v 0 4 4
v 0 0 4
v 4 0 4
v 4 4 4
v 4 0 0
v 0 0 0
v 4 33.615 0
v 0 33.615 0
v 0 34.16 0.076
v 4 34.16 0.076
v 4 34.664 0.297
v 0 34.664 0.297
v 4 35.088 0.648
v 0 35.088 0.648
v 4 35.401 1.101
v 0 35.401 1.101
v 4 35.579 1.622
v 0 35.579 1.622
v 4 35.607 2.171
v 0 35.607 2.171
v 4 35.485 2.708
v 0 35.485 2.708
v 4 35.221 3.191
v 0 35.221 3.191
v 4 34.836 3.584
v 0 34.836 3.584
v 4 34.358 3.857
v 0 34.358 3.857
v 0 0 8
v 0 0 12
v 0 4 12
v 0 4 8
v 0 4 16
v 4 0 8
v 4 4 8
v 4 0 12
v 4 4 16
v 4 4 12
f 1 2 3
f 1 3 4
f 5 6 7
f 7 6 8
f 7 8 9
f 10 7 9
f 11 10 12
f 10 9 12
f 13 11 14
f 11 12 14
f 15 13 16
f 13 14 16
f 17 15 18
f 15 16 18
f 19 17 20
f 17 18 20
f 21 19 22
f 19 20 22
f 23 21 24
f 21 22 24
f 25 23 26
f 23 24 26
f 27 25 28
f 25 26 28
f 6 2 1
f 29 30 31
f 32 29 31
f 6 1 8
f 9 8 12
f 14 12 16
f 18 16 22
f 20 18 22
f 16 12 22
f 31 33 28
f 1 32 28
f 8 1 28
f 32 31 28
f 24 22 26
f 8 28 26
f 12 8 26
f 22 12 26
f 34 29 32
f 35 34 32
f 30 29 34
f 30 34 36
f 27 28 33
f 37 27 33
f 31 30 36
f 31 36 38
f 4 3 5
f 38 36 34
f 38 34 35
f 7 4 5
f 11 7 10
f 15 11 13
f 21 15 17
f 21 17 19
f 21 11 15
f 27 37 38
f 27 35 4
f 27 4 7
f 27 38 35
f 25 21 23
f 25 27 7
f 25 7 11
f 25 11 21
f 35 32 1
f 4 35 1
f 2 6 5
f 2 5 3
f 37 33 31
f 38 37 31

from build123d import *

# Parameters (mm, degrees)
F0_W     = 4
F0_H     = 4
F1_DEPTH = 4


with BuildPart() as f1:
    # F0 (on Right) → F1 (new body)
    with BuildSketch(Plane.YZ):
        with BuildLine():
            Line((4, 4), (4, 0))
            Line((4, 0), (33.614835, 0))
            ThreePointArc((33.614835, 0), (35.578748, 1.621785), (34.357617, 3.856953))
            Line((34.357617, 3.856953), (4, 16))
            Line((4, 16), (4, 12))
            Line((4, 12), (4, 8))
            Line((4, 8), (4, 4))
        make_face()
        with Locations((2, 10)):
            Rectangle(F0_W, F0_H)
        with Locations((2, 2)):
            Rectangle(F0_W, F0_H)
    extrude(amount=F1_DEPTH)


solid = f1.part
